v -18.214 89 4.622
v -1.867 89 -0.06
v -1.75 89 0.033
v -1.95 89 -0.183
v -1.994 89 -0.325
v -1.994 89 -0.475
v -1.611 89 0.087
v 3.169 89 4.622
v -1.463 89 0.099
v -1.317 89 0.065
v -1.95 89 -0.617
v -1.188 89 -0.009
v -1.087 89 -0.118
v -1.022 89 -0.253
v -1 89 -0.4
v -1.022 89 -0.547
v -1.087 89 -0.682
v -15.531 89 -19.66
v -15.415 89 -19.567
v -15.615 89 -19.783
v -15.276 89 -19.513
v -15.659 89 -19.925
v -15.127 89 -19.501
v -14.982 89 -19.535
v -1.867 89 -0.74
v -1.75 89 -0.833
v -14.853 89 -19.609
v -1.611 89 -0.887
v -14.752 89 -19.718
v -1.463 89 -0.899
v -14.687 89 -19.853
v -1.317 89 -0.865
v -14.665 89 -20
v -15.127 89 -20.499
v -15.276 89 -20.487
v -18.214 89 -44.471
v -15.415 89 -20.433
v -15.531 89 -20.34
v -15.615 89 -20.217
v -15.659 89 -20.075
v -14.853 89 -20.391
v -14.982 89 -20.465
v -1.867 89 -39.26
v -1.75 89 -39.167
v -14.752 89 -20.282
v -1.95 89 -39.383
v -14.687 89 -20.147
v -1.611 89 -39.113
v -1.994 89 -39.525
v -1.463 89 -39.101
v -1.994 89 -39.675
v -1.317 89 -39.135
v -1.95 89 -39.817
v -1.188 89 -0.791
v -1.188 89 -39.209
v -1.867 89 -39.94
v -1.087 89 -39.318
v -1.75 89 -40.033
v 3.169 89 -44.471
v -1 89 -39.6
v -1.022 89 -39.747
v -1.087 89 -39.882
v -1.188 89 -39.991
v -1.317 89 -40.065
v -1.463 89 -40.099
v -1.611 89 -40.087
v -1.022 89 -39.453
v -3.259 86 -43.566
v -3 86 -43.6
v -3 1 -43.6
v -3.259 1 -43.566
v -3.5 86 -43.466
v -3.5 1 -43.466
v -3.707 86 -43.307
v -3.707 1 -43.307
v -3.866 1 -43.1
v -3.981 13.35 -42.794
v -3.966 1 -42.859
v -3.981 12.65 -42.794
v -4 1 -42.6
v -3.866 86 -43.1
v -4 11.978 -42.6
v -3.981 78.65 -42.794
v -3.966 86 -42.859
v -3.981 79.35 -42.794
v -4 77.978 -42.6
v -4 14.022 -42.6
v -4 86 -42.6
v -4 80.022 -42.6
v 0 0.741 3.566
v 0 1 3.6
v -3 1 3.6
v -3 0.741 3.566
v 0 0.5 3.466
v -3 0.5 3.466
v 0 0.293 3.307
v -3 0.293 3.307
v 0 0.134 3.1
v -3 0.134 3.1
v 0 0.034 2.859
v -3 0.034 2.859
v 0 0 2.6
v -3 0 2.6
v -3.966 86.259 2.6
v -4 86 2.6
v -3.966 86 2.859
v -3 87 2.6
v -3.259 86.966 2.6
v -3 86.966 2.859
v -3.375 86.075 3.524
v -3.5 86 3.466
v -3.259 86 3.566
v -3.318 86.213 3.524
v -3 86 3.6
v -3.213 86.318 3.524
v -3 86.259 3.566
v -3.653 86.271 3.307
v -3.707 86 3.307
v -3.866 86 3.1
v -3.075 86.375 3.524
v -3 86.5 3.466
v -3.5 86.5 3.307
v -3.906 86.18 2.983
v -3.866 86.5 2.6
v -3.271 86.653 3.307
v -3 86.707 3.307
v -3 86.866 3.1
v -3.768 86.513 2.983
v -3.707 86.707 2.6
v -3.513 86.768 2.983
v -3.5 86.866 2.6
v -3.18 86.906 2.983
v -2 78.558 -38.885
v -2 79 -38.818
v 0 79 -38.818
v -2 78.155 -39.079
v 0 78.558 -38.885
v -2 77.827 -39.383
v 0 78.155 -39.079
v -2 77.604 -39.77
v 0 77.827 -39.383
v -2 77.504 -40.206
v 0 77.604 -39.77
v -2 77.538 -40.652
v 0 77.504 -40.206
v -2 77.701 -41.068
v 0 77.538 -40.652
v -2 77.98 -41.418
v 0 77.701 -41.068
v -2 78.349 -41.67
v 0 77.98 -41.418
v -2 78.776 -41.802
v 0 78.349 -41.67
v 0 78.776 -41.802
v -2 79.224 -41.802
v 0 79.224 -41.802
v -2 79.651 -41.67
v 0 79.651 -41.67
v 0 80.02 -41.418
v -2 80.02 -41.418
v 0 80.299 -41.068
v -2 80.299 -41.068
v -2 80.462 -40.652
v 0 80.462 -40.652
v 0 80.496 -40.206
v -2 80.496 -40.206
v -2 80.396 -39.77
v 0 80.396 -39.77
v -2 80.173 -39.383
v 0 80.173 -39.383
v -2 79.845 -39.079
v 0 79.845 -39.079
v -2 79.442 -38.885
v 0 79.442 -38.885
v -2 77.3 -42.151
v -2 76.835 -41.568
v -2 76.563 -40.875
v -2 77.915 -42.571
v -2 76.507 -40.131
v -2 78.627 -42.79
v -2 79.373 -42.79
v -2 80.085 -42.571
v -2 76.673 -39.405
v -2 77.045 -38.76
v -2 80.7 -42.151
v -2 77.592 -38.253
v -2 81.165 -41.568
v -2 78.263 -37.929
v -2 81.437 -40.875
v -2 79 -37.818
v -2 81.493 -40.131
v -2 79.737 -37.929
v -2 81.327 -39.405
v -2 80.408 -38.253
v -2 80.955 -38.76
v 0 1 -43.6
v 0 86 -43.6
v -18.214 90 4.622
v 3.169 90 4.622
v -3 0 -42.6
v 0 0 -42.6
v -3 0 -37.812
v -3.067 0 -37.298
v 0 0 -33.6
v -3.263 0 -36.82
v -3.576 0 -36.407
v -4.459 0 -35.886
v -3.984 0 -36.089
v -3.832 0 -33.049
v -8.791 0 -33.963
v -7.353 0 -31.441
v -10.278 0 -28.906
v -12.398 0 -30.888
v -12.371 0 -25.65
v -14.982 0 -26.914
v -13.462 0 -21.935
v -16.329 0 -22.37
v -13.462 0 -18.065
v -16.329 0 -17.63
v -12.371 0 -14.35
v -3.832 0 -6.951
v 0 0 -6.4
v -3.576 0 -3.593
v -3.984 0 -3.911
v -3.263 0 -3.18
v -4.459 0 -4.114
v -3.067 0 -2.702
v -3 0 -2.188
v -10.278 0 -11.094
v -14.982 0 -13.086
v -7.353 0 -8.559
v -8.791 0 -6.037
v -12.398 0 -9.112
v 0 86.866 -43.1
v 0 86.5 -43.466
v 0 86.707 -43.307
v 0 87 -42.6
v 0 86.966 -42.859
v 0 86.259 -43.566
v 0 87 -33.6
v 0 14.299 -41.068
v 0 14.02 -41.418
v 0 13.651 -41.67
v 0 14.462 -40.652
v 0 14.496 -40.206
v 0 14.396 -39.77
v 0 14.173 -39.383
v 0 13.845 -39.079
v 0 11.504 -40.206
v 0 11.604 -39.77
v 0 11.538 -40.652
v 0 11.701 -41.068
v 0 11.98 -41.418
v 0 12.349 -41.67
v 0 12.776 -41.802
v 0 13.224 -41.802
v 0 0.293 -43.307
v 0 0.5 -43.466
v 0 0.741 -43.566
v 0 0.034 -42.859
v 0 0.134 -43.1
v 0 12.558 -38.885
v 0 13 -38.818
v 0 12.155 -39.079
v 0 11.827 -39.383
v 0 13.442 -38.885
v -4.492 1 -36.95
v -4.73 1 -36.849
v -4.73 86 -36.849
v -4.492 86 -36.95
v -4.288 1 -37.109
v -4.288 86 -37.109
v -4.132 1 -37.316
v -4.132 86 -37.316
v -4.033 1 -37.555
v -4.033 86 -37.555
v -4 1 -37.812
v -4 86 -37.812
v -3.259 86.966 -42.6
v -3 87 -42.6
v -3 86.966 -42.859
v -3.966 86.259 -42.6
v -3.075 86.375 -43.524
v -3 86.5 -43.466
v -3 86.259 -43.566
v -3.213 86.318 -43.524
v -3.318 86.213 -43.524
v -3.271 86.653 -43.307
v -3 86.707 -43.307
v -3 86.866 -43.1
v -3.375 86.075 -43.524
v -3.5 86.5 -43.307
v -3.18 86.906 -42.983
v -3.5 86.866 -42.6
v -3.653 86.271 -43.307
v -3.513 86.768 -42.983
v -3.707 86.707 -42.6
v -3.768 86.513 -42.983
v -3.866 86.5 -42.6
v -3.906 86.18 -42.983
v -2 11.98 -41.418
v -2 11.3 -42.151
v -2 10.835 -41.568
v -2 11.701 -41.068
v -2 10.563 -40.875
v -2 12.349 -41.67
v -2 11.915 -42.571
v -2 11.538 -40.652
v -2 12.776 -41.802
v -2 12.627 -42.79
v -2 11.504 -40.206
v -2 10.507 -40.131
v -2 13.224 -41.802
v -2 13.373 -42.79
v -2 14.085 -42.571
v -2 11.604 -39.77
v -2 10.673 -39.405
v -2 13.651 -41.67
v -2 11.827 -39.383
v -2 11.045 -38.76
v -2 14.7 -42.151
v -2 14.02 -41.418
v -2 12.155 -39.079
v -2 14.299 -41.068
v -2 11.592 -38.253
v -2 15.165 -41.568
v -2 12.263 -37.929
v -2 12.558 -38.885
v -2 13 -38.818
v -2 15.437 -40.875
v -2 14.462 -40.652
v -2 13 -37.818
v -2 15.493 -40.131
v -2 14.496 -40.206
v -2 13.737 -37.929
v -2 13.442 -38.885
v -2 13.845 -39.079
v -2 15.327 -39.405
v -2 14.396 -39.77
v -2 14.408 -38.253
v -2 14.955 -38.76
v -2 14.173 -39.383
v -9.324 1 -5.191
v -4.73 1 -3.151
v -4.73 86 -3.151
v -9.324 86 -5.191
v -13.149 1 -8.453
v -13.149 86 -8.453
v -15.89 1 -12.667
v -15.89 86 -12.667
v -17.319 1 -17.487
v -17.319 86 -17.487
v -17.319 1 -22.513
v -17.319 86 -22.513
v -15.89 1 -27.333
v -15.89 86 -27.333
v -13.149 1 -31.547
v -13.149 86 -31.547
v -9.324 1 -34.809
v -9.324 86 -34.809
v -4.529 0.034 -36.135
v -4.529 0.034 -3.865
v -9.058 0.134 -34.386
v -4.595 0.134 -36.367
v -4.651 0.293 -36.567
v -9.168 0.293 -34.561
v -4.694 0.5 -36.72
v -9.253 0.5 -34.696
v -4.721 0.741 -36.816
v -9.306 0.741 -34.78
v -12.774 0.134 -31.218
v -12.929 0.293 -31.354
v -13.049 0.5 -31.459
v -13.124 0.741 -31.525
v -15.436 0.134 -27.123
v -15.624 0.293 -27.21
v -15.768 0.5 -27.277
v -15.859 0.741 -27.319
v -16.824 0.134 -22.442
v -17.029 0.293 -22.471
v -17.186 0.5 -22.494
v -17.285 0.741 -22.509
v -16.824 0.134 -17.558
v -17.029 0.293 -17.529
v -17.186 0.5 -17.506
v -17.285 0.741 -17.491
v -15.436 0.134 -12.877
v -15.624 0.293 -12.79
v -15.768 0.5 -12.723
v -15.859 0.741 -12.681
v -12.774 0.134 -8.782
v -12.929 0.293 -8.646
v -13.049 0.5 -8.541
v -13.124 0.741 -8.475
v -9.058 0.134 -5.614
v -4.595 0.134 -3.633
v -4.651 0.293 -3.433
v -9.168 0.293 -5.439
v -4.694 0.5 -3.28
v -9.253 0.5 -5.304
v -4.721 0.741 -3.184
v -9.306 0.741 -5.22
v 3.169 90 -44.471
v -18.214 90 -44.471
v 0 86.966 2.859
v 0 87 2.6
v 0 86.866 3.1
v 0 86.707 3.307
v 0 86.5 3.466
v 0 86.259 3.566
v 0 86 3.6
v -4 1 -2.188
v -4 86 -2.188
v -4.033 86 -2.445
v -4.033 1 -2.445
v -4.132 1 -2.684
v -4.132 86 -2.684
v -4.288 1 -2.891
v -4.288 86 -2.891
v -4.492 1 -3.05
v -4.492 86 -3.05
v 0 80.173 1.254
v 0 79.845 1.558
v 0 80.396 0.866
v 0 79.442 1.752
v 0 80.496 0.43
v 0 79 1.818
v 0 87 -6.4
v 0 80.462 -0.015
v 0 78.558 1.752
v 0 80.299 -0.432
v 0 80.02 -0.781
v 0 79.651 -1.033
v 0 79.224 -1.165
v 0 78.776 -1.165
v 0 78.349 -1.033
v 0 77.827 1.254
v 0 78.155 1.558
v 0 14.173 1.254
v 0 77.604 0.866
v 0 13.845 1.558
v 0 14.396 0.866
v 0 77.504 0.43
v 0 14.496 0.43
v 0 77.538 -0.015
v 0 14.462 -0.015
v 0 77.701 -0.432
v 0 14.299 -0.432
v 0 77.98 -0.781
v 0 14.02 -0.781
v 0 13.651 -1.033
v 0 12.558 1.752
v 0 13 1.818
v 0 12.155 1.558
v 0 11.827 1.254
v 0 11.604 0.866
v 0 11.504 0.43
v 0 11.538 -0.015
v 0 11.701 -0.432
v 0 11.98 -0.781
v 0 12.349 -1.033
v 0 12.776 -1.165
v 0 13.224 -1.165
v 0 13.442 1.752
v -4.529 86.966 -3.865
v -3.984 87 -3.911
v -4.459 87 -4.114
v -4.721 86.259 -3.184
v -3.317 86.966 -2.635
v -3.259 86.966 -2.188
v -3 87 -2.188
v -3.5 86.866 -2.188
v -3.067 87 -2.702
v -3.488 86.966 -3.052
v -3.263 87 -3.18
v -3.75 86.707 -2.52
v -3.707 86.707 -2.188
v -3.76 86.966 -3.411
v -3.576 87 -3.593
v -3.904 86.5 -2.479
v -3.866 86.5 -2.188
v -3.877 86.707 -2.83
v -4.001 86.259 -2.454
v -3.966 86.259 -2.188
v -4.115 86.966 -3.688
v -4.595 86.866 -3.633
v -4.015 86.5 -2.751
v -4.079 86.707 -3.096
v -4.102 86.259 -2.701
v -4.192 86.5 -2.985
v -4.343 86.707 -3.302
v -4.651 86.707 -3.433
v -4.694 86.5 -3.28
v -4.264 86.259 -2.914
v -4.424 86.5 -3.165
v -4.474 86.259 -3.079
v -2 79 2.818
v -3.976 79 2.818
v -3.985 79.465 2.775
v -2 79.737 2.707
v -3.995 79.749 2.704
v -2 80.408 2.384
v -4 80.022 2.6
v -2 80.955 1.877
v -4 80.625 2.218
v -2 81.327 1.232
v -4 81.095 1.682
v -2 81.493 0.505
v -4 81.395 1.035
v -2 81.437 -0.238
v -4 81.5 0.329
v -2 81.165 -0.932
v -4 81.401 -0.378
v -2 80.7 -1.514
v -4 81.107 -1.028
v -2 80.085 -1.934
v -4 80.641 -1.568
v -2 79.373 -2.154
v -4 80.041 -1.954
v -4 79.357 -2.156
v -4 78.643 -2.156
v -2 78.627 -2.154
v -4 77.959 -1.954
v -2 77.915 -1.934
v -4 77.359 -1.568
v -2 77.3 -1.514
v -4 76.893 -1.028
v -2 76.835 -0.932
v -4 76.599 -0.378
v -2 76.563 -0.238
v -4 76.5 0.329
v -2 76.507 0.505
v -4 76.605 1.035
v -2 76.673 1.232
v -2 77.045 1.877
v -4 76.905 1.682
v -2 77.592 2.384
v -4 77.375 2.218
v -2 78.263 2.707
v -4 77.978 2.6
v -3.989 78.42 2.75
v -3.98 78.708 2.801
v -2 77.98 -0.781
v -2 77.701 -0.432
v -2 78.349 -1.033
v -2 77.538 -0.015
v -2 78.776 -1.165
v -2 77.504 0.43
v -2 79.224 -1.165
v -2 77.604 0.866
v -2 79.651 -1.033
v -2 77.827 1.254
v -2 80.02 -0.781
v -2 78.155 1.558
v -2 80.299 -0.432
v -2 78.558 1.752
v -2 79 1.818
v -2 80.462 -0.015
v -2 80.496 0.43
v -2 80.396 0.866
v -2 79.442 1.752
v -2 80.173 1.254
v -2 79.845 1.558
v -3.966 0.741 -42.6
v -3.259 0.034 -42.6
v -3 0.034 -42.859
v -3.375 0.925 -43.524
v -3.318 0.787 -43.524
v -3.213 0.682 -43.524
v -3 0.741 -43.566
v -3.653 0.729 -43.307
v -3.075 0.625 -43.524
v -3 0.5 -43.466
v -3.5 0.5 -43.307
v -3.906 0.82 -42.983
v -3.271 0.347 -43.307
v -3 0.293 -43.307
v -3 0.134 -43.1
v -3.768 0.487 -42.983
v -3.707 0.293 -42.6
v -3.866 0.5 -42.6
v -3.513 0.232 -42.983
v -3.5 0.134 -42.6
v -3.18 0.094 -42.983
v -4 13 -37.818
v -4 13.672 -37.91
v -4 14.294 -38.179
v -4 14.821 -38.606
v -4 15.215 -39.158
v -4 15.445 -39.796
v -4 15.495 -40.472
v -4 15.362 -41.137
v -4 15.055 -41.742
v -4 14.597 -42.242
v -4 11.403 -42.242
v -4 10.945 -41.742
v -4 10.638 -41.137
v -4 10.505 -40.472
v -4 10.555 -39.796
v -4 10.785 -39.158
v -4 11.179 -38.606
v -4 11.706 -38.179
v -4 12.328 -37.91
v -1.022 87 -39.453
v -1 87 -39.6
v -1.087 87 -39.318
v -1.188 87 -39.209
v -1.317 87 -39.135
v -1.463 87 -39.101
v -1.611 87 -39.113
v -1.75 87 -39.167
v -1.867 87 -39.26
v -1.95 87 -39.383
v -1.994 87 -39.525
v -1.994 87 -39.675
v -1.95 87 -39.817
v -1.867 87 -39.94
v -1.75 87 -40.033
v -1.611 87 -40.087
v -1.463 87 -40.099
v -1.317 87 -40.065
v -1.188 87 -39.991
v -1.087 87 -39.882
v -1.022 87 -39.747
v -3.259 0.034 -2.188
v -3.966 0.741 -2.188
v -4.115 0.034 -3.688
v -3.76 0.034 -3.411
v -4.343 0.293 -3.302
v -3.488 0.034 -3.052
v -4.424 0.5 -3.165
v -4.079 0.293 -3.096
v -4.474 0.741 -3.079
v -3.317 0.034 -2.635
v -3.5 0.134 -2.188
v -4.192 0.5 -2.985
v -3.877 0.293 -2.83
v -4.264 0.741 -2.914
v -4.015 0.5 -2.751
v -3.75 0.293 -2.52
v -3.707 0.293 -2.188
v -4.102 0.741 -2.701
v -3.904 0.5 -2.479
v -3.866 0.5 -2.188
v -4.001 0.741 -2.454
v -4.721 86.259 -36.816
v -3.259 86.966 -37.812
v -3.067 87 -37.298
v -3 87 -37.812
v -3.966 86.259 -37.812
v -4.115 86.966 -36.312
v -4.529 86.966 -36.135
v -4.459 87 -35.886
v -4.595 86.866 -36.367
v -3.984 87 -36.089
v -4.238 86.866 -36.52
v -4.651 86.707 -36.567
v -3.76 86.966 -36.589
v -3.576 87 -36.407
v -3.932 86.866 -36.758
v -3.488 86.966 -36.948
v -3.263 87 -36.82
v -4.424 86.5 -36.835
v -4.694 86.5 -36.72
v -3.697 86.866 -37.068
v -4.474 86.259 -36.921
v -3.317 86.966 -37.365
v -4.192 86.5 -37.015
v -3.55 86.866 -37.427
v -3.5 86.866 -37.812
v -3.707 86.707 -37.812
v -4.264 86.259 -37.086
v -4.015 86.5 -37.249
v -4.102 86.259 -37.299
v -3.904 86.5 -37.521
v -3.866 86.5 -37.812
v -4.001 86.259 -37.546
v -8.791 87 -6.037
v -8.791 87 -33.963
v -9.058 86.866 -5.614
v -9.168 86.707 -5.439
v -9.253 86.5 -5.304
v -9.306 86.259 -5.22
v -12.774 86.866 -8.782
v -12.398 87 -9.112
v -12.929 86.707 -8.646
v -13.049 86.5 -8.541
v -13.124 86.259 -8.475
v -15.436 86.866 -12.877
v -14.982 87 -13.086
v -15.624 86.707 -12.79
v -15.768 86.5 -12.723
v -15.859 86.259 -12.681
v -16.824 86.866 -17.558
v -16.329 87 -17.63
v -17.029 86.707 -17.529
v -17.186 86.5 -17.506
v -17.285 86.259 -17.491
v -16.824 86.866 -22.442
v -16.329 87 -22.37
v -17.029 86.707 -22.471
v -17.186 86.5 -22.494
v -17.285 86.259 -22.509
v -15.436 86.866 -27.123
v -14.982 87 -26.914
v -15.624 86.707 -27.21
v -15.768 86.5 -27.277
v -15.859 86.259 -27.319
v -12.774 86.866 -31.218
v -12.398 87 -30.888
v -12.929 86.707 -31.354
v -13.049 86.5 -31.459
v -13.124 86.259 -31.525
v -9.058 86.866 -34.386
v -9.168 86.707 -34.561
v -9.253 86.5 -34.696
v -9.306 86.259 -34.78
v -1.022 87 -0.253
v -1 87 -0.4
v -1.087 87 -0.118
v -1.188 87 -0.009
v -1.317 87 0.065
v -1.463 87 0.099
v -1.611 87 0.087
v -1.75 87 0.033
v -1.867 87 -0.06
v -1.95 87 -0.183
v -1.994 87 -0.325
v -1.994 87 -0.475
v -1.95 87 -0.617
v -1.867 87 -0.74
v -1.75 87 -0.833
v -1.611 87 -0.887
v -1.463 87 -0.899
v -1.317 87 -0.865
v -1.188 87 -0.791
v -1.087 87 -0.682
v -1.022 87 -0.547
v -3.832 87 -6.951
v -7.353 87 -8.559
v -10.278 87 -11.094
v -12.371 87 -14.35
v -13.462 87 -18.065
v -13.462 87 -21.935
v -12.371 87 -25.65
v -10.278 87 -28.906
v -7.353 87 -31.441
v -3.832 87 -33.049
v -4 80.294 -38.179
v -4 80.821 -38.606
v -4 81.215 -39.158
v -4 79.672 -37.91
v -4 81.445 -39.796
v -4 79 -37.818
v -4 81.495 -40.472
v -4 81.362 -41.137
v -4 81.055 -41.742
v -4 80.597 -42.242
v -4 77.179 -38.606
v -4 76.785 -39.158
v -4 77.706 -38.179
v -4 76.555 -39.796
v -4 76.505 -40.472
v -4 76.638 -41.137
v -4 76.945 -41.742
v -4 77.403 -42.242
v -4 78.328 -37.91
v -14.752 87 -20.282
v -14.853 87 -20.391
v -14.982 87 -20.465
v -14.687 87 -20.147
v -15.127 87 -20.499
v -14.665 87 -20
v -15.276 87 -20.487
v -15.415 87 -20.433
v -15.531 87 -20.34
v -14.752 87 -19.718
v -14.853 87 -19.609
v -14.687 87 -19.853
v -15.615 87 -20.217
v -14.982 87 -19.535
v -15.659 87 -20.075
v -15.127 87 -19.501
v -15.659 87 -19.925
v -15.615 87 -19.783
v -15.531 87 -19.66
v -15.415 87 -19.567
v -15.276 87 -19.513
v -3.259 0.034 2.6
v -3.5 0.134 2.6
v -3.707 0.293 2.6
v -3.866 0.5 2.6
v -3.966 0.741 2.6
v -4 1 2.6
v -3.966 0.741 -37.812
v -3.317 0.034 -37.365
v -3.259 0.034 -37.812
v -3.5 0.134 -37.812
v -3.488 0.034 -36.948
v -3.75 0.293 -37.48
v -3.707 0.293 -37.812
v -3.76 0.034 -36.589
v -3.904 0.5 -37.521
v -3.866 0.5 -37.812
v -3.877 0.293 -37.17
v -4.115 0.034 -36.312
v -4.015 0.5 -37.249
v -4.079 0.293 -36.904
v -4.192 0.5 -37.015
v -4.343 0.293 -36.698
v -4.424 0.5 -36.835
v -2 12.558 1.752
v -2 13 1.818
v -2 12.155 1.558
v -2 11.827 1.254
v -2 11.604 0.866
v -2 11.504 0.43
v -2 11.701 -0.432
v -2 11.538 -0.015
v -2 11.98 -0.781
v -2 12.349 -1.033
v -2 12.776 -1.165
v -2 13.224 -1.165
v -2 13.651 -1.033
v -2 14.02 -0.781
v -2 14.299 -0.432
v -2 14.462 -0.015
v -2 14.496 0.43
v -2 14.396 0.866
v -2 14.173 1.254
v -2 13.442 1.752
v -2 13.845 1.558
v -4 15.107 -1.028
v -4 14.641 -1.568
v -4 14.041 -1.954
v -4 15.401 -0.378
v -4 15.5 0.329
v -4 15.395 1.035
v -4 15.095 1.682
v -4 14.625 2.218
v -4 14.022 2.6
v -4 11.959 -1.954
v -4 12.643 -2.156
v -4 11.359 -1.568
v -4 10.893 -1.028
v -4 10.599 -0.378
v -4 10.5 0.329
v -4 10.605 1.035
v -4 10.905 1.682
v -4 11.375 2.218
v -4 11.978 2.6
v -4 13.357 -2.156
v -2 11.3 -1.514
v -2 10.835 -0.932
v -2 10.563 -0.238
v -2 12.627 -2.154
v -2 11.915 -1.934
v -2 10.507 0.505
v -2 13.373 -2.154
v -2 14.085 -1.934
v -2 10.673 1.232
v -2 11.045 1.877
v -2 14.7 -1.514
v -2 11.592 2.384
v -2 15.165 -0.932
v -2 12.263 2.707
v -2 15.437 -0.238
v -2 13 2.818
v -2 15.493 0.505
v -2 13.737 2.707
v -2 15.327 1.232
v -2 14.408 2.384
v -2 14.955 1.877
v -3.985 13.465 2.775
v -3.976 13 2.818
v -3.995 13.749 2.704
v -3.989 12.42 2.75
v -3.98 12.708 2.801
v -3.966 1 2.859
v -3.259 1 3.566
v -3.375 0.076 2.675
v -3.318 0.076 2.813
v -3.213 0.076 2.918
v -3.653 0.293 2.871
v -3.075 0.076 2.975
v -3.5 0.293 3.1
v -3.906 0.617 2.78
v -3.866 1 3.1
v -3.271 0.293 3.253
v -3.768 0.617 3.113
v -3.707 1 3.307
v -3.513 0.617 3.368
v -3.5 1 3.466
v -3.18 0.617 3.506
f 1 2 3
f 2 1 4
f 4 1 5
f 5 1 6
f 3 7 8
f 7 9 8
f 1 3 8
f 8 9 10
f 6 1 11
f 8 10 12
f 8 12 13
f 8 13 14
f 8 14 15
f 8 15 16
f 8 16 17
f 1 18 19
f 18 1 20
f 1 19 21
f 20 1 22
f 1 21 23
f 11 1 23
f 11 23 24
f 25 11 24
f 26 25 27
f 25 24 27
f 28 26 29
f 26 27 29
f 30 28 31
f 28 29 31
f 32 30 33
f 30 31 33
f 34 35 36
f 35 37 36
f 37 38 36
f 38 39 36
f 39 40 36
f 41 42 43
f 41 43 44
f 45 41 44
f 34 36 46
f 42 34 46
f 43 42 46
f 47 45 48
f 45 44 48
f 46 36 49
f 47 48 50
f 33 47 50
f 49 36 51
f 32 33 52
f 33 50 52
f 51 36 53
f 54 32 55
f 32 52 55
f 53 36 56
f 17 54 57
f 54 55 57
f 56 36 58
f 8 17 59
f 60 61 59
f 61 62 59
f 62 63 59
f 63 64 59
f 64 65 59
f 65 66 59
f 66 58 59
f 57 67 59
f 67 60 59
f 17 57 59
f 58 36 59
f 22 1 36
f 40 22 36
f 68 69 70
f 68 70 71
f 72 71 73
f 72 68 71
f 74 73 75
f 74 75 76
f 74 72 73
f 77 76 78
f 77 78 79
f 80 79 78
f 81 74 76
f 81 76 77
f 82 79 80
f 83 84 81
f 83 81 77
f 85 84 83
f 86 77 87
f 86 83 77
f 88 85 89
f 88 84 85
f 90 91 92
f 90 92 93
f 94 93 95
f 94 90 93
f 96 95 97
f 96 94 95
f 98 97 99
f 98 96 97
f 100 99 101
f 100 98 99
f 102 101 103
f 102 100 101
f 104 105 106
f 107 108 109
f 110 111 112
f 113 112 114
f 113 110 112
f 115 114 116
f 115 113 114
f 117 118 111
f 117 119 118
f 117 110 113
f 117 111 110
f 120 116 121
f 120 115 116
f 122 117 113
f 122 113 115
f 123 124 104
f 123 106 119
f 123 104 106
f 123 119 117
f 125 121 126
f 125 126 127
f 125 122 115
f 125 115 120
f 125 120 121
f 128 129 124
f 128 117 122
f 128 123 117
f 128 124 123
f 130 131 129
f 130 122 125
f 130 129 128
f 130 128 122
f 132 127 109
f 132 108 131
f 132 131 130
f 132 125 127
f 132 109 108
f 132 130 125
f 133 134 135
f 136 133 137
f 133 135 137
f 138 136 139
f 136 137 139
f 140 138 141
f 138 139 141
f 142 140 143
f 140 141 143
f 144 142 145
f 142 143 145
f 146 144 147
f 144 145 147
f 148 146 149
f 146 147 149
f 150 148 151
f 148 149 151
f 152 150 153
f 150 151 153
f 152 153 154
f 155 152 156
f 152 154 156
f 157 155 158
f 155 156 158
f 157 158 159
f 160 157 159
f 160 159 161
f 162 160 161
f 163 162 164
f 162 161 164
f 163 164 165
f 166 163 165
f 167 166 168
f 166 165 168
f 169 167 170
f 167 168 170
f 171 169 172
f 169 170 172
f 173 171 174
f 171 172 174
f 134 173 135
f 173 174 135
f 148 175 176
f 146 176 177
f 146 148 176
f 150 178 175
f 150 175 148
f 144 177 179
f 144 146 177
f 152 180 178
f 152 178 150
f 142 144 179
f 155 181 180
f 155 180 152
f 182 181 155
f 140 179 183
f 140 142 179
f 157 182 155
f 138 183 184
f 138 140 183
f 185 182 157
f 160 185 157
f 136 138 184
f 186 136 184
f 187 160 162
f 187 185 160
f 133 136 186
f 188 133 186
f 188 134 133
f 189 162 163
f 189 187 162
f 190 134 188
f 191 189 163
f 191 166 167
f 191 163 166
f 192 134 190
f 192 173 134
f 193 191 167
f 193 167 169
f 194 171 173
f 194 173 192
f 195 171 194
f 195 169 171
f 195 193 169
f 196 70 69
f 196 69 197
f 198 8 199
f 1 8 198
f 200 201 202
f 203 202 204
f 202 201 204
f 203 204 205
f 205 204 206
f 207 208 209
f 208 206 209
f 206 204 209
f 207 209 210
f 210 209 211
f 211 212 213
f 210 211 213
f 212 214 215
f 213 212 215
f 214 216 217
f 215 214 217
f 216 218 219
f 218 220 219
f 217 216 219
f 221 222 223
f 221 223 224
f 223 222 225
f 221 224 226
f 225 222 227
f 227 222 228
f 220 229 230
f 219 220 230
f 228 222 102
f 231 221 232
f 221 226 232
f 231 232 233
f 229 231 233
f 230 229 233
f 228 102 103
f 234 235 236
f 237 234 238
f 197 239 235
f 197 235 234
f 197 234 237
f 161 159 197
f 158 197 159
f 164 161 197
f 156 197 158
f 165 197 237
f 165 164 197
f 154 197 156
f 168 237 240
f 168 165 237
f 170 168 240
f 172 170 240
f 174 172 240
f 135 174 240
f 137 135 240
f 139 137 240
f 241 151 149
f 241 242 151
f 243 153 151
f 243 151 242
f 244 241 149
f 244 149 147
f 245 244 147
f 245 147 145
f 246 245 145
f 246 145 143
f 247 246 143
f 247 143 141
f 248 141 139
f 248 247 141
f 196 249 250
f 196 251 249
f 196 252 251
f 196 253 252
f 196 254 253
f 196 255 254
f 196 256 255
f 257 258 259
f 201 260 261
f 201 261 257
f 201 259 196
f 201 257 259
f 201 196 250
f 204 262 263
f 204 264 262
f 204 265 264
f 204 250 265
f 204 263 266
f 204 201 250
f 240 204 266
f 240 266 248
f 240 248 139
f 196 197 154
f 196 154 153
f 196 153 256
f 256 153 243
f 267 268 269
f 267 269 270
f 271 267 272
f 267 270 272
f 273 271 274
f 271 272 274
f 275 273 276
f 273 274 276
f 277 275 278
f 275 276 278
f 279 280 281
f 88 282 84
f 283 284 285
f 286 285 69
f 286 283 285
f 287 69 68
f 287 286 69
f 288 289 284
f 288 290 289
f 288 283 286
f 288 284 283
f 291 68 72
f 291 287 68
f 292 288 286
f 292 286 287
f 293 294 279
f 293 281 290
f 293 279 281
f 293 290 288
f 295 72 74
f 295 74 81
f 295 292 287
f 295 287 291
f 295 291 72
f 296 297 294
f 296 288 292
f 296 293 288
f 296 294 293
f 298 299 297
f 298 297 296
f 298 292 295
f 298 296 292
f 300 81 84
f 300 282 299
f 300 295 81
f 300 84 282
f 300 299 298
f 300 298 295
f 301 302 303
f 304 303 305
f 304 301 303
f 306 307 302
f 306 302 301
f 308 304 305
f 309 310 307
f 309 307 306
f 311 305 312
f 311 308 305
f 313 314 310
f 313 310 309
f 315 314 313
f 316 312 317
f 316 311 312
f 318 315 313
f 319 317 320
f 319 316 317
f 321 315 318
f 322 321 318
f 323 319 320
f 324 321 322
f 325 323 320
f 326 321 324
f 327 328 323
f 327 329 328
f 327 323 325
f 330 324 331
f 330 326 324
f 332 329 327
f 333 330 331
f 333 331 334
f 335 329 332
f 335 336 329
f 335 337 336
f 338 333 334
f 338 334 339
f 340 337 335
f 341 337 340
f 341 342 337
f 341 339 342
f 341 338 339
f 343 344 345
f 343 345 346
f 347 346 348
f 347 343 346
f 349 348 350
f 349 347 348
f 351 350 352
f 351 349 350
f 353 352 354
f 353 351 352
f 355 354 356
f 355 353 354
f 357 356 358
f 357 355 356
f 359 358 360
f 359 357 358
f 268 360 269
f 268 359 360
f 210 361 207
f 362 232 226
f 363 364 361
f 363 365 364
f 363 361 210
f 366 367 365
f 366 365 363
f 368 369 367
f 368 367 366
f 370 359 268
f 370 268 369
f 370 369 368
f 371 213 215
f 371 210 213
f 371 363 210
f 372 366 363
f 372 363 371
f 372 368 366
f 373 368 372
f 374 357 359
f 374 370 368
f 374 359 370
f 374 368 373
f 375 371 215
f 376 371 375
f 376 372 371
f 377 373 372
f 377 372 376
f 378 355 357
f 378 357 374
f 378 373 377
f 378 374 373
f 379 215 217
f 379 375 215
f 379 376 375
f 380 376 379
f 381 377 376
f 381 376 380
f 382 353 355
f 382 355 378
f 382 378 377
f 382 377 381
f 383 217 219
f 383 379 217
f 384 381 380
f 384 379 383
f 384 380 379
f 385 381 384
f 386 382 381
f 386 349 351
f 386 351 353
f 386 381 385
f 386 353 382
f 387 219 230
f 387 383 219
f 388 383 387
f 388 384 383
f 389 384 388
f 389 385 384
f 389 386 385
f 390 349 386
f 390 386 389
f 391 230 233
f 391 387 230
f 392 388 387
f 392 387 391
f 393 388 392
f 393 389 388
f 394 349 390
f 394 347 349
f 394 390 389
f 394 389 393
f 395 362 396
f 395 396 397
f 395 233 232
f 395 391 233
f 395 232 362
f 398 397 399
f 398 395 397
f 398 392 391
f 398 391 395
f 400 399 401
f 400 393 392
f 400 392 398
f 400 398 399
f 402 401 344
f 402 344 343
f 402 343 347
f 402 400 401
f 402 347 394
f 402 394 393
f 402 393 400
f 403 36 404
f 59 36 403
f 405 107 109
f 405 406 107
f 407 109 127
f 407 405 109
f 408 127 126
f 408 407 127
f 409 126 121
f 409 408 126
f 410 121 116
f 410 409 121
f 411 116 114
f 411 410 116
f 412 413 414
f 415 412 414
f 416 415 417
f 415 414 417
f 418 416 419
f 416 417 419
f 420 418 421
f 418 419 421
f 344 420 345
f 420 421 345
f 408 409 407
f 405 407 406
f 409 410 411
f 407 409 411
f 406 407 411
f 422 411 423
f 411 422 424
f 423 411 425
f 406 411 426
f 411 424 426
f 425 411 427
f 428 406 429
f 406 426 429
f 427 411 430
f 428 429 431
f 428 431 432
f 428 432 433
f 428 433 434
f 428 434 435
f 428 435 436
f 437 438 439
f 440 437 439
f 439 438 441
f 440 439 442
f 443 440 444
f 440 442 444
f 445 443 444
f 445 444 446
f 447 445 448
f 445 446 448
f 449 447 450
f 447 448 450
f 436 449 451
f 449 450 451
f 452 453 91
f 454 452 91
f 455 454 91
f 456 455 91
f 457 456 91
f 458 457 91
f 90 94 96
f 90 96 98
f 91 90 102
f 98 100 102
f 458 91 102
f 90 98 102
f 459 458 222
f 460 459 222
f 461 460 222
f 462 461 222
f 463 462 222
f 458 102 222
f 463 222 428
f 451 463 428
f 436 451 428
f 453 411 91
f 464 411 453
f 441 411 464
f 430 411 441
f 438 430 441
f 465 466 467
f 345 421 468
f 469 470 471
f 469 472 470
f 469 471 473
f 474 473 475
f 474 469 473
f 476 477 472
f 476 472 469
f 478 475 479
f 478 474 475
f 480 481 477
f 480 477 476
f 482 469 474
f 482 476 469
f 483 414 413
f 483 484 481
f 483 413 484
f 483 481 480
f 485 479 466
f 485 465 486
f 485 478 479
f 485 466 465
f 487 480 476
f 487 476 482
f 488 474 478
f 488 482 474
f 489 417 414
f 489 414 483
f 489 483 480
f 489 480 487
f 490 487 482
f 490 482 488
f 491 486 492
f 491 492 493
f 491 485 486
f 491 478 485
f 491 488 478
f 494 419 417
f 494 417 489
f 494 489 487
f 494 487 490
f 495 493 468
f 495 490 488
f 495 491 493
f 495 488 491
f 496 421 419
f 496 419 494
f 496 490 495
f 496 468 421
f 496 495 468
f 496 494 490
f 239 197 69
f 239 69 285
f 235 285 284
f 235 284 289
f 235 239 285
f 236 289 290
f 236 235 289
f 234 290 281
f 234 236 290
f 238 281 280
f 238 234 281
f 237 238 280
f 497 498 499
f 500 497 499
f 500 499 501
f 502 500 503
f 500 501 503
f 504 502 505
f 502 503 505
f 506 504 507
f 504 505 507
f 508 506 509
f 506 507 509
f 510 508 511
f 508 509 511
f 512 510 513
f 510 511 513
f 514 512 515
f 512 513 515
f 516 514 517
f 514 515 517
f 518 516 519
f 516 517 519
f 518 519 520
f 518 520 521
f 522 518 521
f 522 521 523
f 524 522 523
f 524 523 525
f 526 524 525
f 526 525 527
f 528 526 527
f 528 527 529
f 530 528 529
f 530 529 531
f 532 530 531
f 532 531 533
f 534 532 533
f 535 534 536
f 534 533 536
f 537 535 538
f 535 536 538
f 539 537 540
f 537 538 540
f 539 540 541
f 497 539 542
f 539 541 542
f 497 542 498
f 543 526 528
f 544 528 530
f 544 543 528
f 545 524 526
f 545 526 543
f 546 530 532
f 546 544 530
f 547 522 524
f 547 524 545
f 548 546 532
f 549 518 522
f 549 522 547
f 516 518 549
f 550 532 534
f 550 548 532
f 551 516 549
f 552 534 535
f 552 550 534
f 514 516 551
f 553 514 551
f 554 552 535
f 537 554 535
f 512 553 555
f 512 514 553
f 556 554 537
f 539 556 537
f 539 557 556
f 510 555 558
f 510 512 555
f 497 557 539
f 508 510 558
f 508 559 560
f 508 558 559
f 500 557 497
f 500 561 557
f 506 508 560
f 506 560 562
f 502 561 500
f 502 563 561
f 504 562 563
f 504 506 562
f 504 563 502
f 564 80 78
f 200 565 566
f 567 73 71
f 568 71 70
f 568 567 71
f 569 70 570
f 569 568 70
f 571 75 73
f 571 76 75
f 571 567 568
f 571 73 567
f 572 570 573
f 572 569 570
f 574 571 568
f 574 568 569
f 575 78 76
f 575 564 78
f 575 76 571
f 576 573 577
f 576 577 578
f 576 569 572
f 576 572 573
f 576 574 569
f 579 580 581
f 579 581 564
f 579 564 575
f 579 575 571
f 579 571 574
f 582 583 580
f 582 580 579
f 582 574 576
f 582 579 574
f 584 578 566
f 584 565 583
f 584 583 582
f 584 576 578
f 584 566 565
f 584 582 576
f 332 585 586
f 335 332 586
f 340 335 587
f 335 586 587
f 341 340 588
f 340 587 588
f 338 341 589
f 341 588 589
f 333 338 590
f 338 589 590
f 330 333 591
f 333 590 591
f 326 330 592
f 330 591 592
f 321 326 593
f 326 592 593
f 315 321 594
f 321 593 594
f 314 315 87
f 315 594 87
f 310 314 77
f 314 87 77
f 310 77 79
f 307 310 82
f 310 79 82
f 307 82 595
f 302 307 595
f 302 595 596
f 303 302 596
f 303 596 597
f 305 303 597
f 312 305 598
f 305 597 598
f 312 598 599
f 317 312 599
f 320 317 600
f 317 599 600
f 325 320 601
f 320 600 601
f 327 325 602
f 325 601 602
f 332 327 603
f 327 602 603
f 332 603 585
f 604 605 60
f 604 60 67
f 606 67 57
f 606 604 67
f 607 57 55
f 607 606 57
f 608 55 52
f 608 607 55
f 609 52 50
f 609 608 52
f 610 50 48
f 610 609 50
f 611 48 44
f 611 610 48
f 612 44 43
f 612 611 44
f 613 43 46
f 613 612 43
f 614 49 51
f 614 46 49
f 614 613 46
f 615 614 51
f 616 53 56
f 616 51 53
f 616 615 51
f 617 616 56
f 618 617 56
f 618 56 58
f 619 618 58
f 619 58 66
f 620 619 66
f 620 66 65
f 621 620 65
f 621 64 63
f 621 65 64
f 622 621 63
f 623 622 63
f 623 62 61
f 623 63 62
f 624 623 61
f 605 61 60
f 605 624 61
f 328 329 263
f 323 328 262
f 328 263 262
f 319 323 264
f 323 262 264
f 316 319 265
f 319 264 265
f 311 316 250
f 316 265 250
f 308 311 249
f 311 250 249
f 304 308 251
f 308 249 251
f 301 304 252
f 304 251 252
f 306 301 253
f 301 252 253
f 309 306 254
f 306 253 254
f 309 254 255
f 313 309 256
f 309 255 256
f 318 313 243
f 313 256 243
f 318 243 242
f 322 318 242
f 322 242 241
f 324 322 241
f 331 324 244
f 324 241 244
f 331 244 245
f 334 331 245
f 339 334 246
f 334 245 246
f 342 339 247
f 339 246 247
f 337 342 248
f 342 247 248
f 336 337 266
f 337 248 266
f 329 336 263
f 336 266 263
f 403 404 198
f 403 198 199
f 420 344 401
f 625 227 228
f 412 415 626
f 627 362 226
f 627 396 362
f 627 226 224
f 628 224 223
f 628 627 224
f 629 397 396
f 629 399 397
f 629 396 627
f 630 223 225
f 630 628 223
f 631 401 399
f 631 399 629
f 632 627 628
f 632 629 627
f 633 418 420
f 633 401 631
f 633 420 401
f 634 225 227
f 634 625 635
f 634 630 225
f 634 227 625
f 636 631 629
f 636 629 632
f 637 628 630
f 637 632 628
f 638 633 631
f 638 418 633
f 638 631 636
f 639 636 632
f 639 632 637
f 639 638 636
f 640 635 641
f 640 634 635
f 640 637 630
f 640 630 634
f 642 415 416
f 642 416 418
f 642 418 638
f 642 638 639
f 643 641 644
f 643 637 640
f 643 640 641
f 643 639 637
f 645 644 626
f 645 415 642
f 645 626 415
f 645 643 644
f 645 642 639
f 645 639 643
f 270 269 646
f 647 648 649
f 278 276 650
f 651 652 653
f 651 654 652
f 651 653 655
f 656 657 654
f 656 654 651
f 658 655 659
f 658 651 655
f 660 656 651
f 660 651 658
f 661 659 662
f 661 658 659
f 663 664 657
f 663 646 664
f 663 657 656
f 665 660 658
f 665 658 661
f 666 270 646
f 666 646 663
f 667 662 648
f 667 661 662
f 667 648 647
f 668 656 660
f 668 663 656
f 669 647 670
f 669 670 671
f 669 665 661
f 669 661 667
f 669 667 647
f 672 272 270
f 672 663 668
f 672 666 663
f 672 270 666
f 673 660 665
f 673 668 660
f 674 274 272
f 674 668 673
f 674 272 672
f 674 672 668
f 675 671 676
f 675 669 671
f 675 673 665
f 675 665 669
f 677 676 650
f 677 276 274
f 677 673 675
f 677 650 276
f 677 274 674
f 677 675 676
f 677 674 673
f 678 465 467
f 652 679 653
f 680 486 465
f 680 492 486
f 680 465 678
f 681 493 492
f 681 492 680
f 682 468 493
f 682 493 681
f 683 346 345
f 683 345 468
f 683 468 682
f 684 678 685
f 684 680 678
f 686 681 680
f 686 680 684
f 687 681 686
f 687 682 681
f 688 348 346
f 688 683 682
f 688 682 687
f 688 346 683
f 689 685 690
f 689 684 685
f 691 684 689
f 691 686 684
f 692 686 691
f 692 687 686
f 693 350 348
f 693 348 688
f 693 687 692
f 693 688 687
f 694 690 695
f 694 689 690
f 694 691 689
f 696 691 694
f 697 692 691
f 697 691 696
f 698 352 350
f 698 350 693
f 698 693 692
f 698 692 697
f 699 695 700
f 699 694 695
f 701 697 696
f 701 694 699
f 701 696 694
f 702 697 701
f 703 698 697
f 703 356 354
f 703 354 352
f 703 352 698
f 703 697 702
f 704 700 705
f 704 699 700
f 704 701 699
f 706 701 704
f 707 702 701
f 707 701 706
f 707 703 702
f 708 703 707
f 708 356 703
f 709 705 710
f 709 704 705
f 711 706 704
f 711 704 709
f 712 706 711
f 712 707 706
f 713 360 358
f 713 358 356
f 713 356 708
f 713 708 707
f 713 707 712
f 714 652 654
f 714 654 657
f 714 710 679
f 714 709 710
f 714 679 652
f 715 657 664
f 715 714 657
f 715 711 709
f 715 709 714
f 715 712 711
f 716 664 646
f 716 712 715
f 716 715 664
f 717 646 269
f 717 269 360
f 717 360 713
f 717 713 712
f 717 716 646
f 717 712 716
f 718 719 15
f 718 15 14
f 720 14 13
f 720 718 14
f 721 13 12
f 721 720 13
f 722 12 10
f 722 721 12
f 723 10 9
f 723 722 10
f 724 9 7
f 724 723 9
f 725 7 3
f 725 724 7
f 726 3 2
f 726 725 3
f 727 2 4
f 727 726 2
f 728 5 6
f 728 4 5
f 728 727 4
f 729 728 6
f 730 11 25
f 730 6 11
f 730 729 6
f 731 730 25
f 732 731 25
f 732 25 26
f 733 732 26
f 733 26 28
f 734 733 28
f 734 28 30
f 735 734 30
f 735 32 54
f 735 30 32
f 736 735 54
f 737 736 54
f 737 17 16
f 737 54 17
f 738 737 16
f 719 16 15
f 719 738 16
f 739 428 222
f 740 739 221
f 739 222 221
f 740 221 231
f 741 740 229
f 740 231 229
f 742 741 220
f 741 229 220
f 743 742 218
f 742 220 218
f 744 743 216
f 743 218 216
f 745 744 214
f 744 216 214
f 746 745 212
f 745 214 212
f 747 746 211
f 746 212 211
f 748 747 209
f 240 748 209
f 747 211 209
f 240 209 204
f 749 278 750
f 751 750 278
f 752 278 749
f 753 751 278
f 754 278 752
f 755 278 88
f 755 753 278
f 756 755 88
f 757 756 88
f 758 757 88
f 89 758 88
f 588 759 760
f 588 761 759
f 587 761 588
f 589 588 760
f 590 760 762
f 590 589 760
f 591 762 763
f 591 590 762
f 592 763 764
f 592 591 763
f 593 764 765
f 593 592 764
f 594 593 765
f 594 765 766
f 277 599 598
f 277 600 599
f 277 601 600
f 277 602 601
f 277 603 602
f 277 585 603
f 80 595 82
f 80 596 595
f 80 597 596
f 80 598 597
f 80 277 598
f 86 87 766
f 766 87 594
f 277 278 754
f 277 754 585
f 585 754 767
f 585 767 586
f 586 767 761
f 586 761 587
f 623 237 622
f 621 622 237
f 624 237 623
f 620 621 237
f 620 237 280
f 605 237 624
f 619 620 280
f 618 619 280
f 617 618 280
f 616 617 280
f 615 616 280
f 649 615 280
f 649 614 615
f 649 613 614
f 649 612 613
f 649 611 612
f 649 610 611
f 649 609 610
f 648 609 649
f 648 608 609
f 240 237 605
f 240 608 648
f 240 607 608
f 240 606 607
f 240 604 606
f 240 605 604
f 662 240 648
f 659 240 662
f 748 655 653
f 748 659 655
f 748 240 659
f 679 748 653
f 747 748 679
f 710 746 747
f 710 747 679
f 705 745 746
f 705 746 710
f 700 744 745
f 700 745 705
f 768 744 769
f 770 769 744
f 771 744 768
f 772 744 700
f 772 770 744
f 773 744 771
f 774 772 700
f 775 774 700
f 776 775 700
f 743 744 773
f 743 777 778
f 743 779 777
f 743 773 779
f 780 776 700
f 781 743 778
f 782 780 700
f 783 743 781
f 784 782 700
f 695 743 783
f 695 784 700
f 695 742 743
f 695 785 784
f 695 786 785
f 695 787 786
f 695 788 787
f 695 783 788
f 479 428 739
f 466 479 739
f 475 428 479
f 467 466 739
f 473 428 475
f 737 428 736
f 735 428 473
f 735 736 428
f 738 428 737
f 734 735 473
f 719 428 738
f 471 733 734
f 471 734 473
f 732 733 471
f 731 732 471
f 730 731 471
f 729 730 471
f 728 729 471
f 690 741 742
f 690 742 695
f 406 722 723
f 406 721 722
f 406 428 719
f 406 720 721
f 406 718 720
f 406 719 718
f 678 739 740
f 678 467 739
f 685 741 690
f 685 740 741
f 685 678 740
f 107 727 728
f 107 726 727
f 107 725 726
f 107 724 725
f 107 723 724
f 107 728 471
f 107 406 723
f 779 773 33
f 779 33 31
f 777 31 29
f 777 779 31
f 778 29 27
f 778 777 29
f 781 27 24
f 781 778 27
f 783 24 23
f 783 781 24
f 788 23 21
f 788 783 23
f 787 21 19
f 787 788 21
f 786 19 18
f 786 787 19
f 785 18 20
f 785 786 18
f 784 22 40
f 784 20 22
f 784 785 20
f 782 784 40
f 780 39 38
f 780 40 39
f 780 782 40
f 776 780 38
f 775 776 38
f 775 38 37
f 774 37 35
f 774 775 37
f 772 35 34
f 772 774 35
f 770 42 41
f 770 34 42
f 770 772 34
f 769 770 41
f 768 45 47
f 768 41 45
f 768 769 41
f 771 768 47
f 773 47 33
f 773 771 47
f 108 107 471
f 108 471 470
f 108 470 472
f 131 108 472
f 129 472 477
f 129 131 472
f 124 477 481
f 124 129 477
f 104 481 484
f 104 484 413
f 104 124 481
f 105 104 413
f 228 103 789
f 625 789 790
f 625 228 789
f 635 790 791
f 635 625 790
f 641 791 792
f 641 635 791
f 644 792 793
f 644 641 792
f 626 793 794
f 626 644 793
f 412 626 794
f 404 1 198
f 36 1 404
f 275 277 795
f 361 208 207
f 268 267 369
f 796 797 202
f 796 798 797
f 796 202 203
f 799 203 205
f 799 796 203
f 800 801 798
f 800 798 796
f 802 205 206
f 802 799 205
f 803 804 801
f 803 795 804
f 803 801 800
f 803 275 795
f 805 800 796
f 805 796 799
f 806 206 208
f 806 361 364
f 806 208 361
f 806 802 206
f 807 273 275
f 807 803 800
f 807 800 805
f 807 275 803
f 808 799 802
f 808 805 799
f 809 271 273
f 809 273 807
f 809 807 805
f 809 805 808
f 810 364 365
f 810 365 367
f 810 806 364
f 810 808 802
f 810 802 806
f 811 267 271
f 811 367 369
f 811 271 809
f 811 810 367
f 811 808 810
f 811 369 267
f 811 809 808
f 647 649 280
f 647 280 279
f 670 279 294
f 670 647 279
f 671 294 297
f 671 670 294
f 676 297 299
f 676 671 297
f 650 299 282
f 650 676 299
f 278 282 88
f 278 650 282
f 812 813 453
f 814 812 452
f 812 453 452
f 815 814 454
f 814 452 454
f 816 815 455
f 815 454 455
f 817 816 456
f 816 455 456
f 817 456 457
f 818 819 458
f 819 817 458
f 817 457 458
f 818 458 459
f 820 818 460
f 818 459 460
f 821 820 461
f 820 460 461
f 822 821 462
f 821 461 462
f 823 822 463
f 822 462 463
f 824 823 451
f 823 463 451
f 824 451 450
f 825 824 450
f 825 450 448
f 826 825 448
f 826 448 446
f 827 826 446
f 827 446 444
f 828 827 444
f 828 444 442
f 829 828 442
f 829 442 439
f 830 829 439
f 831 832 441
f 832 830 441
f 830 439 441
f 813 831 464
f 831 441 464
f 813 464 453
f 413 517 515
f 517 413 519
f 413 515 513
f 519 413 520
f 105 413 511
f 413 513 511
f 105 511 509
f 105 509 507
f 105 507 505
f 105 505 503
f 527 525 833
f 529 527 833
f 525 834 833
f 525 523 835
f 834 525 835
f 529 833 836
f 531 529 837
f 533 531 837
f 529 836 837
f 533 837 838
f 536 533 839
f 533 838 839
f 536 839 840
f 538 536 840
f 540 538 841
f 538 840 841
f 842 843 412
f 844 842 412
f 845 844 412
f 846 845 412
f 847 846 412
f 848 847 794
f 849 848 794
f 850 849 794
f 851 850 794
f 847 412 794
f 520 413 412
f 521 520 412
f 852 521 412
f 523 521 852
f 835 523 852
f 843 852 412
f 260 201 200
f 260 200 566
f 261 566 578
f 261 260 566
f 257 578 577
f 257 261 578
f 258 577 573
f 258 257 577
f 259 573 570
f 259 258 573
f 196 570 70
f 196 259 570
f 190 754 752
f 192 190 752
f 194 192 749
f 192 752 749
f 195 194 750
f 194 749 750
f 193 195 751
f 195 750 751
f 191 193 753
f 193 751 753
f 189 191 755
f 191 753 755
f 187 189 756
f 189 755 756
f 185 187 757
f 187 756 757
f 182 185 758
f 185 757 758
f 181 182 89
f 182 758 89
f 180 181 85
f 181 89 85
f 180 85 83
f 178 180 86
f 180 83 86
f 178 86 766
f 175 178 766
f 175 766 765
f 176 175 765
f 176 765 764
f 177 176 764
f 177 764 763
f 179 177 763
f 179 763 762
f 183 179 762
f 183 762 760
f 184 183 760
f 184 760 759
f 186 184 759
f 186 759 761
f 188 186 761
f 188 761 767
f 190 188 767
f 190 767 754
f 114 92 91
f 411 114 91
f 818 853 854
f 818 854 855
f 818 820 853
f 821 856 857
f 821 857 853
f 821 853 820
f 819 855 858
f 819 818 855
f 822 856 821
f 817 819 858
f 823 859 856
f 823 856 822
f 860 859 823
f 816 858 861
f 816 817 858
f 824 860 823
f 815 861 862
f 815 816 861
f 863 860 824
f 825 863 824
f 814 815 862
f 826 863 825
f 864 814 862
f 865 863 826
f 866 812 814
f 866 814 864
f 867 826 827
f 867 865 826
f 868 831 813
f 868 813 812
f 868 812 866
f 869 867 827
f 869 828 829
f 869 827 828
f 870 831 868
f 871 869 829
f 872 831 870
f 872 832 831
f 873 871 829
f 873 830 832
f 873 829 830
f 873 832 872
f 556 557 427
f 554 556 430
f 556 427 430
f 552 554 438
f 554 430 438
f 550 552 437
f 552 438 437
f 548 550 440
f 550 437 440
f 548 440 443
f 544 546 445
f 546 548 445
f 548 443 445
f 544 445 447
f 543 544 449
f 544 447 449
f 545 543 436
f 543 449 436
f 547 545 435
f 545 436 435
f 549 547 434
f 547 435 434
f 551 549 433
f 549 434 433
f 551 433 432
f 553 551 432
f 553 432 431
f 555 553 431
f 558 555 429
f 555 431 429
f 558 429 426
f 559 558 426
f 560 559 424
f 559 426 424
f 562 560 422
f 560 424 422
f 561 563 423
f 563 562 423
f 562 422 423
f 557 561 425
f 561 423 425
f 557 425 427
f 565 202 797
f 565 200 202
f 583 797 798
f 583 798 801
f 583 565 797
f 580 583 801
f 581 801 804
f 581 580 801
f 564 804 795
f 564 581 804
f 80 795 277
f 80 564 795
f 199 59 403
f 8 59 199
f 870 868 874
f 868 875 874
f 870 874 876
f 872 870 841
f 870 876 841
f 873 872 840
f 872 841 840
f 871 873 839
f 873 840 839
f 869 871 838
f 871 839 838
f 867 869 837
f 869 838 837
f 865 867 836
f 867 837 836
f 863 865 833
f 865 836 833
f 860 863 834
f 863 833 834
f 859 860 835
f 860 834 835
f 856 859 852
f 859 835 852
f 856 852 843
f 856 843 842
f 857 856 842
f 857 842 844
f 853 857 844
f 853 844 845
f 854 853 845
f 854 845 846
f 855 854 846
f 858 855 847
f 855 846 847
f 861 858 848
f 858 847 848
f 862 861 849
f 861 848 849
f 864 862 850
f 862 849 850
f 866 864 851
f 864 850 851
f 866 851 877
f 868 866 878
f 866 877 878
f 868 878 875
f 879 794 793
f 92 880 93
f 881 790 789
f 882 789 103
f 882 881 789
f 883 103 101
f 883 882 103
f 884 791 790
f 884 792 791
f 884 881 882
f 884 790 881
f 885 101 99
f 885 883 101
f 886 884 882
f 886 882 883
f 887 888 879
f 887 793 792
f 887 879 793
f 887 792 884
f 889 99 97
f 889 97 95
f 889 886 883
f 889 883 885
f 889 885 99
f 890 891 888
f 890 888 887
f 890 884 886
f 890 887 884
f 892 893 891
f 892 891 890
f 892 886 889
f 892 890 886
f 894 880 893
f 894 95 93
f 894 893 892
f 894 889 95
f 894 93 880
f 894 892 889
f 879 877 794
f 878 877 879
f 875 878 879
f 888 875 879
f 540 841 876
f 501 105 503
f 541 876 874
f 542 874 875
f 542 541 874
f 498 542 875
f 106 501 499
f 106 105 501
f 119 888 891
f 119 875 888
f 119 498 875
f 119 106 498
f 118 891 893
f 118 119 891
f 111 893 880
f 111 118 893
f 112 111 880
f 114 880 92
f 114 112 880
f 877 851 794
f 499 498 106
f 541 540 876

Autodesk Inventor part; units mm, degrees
ref_plane "YZ Plane" through (0, 0, 0) normal (1, 0, 0) x (0, 1, 0)
ref_plane "XZ Plane" through (0, 0, 0) normal (0, 1, 0) x (-1, 0, 0)
ref_plane "XY Plane" through (0, 0, 0) normal (0, 0, 1) x (1, 0, 0)
sketch "スケッチ1" plane through (0, 0, 0) normal (0, 1, 0) x (-1, 0, 0)
  line L0 (0, 0) -> (20, 0)
  line L1 (20, 0) -> (20, -40)
  line L2 (20, -40) -> (0, -40)
  line L3 (0, -40) -> (0, 0)
  circle A0 centre (0, -20) radius 13.6
  circle A1 centre (0, -20) radius 17.5
  line L4 (0, -6.4) -> (4, -6.4)
  line L5 (4, -6.4) -> (4, 3.6)
  line L6 (4, 3.6) -> (0, 3.6)
  line L7 (0, 3.6) -> (0, -6.4)
  line L8 (0, -33.6) -> (4, -33.6)
  line L9 (4, -33.6) -> (4, -43.6)
  line L10 (4, -43.6) -> (0, -43.6)
  line L11 (0, -43.6) -> (0, -33.6)
  point P0 (0, -6.4)
  point P1 (0, -33.6)
  point P2 (4, -37.0367)
  point P3 (4, -2.9633)
  dimension "d0" = 20
  dimension "d1" = 40
  dimension "d2" = 27.2
  dimension "d3" = 35
  dimension "d4" = 4
  dimension "d5" = 10
  dimension "d6" = 4
  dimension "d7" = 10
extrude "押し出し1" add sketch "スケッチ1" along normal blind 87 contours L7 L6 L5 L0 | L0 L5 A1 L3 | A1 L5 L4 L3 | A1 L9 L8 A0 L4 L5 | A1 L9 L2 L3 | L3 L8 L9 A1 | L2 L9 L10 L11
sketch "スケッチ2" plane through (-4, 0, -43.6) normal (-1, 0, 0) x (0, 0, 1)
  line L0 (0, 87) -> (6.5633, 87) projected
  line L1 (40.6367, 87) -> (47.2, 87) projected
  line L2 (40.6367, 0) -> (47.2, 0) projected
  line L3 (0, 0) -> (6.5633, 0) projected
  point P0 (43.6, 0)
  point P1 (3.2816, 13)
  point P2 (3.2816, 79)
  point P3 (43.9184, 79)
  point P4 (43.9184, 13)
  point P5 (3.2816, 87)
  point P6 (43.9184, 87)
  point P7 (43.9184, 0)
  point P8 (3.2816, 0)
  dimension "d10" = 0
  dimension "d11" = 8
  dimension "d12" = 0
  dimension "d13" = 8
  dimension "d14" = 0
  dimension "d15" = 0
  dimension "d16" = 13
  dimension "d17" = 13
hole "穴1" at (-4, 13, -40.3184) at (-4, 79, -40.3184) at (-4, 79, 0.3184) at (-4, 13, 0.3184) direction (1, 0, 0) diameter 3 end through all
fillet "フィレット1" radius 1 14 edges at (-4, 87, 0.3184) (-17.5, 87, -20) (-4, 87, -40.3184) (-2, 87, -43.6) (-2, 87, 3.6) (-4, 43.5, 3.6) (-4, 0, 0.3184) (-17.5, 0, -20) (-4, 0, -40.3184) (-2, 0, -43.6) (-2, 0, 3.6) (-4, 43.5, -43.6) (-4, 43.5, -37.0367) (-4, 43.5, -2.9633)
sketch "スケッチ3" plane through (0, 87, 0) normal (0, 1, 0) x (1, 0, 0)
  line L0 (0, -2.6) -> (-3, -2.6) projected
  line L1 (-3, 42.6) -> (0, 42.6) projected
  circle A0 centre (-1.5, 39.6) radius 0.5
  circle A1 centre (-1.5, 0.4) radius 0.5
  circle A2 centre (-15.1647, 20) radius 0.5
  arc A3 (-4.7297, 36.8487) -> (-4.7297, 3.1513) centre (0, 20) ccw projected
  point P0 (-17.5, 20)
  dimension "d28" = 3
  dimension "d29" = 3
  dimension "d30" = 1
  dimension "d31" = 1
  dimension "d32" = 1
  dimension "d33" = 0
extrude "押し出し2" add sketch "スケッチ3" along normal blind 2
sketch "スケッチ4" plane through (-1.5, 89, -39.6) normal (0, 1, 0) x (1, 0, 0)
  line L0 (-16.7138, 4.8708) -> (4.6687, 4.8708)
  line L1 (4.6687, 4.8708) -> (4.6687, -44.2225)
  line L2 (4.6687, -44.2225) -> (-16.7138, -44.2225)
  line L3 (-16.7138, -44.2225) -> (-16.7138, 4.8708)
  point P0 (1.5, -39.6)
extrude "押し出し3" add sketch "スケッチ4" along normal blind 1
sketch "スケッチ5" plane through (-4, 1, -37.8115) normal (-1, 0, 0) x (0, 0, 1)
  circle A0 centre (-2.5068, 12) radius 1.5 projected
  circle A1 centre (-2.5068, 12) radius 2.5
  circle A2 centre (38.1299, 12) radius 1.5 projected
  circle A3 centre (38.1299, 12) radius 2.5
  circle A4 centre (-2.5068, 78) radius 1.5 projected
  circle A5 centre (-2.5068, 78) radius 2.5
  circle A6 centre (38.1299, 78) radius 1.5 projected
  circle A7 centre (38.1299, 78) radius 2.5
  point P0 (37.8115, -1)
  dimension "d36" = 5
  dimension "d37" = 5
  dimension "d38" = 5
  dimension "d39" = 5
extrude "押し出し4" cut sketch "スケッチ5" against normal blind 2
properties part number "arm-2-2_3D プリント"
